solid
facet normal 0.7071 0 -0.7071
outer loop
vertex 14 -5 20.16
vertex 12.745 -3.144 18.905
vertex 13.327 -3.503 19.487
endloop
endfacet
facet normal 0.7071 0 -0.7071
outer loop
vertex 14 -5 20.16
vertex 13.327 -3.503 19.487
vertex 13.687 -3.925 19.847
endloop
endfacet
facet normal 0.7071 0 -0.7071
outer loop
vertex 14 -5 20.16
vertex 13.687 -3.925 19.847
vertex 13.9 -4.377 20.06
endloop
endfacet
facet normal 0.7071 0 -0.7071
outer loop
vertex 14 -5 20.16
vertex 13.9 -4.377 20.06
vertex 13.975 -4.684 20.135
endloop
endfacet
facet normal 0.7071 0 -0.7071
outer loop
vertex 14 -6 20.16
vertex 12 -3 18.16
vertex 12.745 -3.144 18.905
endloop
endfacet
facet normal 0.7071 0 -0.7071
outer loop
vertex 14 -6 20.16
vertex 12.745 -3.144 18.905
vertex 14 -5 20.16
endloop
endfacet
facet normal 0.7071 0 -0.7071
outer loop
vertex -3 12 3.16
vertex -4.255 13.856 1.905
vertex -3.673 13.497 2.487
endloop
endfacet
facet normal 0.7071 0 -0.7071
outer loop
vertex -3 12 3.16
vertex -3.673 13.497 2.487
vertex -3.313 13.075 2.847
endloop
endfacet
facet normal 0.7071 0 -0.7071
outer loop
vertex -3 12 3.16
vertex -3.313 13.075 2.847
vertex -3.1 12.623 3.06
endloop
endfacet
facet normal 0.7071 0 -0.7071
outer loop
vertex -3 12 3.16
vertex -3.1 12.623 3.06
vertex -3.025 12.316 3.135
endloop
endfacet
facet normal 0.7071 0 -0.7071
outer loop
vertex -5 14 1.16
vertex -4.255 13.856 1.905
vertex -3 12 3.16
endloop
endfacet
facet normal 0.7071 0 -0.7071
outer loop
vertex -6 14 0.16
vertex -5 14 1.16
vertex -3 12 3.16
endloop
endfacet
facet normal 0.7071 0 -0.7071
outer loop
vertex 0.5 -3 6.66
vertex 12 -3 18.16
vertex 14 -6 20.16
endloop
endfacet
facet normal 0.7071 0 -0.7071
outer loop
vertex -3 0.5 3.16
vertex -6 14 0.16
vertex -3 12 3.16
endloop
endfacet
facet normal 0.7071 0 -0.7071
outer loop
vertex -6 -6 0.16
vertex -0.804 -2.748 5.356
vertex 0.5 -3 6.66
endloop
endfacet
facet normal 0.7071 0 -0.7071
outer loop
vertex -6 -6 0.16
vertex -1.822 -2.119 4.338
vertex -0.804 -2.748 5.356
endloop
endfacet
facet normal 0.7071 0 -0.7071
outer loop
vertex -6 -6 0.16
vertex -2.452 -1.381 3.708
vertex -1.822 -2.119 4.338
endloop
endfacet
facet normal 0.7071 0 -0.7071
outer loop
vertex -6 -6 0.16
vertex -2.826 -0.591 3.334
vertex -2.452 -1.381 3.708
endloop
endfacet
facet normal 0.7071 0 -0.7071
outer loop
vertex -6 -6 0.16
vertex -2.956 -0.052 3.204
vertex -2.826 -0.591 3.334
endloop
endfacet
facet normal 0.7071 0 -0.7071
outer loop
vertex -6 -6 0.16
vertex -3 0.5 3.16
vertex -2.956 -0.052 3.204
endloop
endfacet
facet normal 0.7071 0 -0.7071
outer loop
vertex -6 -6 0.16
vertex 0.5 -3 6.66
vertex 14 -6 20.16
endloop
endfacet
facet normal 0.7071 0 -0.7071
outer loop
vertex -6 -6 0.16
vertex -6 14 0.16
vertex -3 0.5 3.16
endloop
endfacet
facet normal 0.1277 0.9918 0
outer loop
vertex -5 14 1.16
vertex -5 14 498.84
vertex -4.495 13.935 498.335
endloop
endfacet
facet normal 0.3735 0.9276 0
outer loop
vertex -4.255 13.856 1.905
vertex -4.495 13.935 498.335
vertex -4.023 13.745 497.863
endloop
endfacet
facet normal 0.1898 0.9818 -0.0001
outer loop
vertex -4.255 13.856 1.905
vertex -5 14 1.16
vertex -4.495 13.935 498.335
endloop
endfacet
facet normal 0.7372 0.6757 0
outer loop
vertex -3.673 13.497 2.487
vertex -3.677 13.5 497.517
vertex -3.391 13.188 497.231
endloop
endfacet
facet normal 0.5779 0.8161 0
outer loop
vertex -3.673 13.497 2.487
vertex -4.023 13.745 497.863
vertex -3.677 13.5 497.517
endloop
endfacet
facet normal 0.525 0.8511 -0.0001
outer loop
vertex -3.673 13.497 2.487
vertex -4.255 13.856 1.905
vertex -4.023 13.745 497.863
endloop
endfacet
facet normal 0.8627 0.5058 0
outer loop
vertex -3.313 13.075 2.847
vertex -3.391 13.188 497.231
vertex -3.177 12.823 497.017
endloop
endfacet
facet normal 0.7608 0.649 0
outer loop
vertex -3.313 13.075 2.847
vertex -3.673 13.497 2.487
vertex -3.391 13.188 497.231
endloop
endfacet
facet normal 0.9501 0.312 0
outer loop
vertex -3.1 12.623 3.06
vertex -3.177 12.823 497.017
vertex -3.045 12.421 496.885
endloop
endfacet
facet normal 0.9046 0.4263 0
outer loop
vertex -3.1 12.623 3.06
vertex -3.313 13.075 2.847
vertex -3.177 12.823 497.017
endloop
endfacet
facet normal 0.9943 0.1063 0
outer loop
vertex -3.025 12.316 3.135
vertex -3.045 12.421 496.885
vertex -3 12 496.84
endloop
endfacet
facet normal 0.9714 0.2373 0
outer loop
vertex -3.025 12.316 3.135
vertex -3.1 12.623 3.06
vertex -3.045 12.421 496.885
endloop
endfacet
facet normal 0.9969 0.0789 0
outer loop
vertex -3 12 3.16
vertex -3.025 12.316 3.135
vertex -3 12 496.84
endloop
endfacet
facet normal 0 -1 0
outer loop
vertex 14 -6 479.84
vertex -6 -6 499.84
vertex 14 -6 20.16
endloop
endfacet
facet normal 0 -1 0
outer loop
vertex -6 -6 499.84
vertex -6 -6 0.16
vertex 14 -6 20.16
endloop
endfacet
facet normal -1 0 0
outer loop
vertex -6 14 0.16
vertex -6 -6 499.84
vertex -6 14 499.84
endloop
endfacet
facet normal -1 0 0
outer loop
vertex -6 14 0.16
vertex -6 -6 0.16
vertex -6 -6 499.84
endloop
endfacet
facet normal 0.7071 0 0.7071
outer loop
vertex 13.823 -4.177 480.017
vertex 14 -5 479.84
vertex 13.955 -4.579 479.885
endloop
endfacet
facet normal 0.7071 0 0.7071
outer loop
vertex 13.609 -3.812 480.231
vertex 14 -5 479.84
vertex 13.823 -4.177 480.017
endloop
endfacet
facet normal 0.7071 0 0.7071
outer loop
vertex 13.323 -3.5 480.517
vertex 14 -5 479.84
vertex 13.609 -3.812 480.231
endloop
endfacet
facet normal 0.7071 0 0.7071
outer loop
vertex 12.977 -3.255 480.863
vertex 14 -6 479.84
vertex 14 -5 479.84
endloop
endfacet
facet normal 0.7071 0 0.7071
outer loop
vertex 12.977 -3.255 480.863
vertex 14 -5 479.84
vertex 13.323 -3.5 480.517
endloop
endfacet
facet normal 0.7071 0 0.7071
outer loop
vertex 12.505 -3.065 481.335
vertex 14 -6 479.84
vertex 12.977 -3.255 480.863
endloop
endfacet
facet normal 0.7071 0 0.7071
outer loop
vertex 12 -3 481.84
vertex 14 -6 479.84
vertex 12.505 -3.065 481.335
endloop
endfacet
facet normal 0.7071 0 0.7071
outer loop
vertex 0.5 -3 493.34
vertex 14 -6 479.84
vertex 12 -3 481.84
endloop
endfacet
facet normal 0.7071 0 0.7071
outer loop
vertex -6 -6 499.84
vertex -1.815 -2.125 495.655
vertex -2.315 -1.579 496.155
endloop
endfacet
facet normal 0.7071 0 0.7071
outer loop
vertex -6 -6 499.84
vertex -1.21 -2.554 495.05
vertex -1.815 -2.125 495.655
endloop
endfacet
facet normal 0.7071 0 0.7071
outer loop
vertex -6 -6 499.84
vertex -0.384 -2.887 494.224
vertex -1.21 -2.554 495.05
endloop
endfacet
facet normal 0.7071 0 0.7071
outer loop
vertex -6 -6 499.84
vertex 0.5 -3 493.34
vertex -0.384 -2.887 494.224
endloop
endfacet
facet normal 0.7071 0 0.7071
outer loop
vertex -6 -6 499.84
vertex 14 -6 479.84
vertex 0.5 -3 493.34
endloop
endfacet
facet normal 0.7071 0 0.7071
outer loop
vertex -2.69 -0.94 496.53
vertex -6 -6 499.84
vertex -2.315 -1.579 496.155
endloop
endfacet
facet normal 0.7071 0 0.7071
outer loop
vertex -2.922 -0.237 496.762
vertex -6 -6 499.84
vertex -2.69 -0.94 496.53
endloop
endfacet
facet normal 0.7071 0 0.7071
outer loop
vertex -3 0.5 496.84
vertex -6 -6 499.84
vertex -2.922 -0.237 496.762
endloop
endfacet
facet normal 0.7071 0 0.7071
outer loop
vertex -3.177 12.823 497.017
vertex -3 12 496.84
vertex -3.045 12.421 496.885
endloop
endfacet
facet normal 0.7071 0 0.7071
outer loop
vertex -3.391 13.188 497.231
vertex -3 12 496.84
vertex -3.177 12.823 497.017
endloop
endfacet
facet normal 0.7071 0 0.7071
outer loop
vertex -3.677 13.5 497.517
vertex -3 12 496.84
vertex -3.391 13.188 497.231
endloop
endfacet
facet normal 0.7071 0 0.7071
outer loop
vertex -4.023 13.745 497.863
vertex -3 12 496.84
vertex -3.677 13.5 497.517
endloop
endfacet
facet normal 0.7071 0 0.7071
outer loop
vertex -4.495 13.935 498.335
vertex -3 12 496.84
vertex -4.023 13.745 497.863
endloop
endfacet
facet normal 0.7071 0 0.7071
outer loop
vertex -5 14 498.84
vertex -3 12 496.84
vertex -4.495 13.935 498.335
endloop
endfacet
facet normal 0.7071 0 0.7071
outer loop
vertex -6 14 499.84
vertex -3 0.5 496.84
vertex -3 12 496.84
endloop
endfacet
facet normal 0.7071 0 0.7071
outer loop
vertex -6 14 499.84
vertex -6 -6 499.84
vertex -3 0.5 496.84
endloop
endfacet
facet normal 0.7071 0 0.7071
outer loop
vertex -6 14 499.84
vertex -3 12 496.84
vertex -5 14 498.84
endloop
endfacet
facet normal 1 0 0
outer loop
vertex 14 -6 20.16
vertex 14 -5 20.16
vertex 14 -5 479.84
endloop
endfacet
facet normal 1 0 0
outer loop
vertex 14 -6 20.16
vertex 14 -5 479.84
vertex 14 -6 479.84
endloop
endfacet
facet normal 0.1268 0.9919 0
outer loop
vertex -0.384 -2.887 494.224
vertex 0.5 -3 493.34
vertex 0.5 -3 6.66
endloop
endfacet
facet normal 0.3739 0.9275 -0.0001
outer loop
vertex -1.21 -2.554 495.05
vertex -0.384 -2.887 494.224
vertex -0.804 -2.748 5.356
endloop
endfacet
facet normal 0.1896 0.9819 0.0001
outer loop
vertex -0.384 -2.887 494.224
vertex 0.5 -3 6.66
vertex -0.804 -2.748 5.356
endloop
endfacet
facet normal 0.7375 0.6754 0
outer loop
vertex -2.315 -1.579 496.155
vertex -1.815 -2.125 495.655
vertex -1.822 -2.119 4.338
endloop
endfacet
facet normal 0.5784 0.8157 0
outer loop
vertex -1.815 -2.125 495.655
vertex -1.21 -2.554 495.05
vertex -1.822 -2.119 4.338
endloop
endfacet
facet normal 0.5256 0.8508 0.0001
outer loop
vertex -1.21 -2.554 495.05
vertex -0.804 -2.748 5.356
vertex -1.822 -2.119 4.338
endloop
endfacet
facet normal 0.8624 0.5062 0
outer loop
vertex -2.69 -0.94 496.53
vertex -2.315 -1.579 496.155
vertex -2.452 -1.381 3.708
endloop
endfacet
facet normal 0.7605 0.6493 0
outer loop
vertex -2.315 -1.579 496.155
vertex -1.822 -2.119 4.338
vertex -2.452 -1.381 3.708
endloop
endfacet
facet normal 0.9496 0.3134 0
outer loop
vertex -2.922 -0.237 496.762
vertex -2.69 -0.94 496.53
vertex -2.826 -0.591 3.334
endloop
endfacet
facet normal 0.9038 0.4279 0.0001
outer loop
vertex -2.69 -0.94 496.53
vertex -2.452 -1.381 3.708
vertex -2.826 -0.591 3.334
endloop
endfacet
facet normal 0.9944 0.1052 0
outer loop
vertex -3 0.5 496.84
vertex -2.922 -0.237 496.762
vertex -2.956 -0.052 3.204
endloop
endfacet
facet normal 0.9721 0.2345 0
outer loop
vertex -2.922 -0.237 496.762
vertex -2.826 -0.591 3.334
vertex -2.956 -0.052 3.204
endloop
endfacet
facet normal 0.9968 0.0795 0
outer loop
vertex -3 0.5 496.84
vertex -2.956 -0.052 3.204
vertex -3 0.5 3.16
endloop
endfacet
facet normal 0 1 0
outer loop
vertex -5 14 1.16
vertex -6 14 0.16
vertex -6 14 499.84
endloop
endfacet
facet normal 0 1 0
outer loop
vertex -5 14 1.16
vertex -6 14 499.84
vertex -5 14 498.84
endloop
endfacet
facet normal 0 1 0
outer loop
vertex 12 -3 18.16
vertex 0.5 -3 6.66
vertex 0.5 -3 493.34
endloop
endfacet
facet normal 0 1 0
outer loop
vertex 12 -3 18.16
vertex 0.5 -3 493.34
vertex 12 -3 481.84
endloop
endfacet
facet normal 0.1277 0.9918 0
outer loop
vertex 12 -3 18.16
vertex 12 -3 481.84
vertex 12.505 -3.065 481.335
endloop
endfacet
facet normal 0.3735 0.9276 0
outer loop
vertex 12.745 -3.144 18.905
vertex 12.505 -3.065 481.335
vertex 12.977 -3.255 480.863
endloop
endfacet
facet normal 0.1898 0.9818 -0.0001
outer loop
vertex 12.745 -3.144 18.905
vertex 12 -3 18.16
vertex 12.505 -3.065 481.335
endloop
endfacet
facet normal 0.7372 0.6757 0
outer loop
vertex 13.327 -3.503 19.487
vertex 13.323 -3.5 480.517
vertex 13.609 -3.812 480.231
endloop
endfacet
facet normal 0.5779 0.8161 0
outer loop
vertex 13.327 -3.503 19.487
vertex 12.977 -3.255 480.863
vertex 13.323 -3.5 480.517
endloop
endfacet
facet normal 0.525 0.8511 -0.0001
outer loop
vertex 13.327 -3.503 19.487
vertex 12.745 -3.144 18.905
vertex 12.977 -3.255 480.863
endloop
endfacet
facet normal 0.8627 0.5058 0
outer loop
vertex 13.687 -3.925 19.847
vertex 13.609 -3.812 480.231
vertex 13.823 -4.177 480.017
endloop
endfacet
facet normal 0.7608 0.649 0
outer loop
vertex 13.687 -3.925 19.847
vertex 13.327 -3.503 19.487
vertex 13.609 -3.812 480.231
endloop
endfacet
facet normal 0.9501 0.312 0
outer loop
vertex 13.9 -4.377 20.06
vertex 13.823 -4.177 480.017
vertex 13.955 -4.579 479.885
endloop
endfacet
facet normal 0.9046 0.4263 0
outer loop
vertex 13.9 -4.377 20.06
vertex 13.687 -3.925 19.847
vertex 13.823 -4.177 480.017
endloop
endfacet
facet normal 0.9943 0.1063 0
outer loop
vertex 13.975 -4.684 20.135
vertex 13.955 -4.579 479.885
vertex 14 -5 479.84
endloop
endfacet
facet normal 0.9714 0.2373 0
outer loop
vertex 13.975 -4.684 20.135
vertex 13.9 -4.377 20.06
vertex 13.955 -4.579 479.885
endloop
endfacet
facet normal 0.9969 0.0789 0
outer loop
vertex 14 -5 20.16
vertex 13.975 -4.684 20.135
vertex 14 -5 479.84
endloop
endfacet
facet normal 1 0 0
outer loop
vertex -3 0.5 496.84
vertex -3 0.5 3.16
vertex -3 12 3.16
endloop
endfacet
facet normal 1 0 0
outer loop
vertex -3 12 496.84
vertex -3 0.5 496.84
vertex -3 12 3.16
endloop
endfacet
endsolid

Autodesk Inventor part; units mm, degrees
ref_plane "Start plane" through (0, 0, 0.16) normal (0, 0, 1) x (1, 0, 0)
ref_plane "End plane" through (0, 0, 499.84) normal (0, 0, 1) x (1, 0, 0)
sketch "Sketch" plane through (0, 0, 0) normal (0, 0, 1) x (1, 0, 0)
  line L0 (-3, 0.5) -> (-3, 12)
  line L1 (-6, 14) -> (-5, 14)
  line L2 (-6, -6) -> (-6, 14)
  line L3 (-6, -6) -> (14, -6)
  line L4 (14, -5) -> (14, -6)
  line L5 (0.5, -3) -> (12, -3)
  arc A0 (-3, 0.5) -> (0.5, -3) centre (0.5, 0.5) ccw
  arc A1 (-3, 12) -> (-5, 14) centre (-5, 12) ccw
  arc A2 (14, -5) -> (12, -3) centre (12, -5) ccw
  line L6 (0, 18.4971) -> (0, -10.0828) construction
  line L7 (-10.0828, 0) -> (18.4971, 0) construction
  point P0 (-3, -3)
  point P1 (-3, 14)
  point P2 (14, -3)
  dimension "d4" = 20
  dimension "d6" = 20
  dimension "d8" = 3
  dimension "d10" = 3
  dimension "d17" = 3.5
  dimension "d18" = 2
  dimension "d19" = 6
  dimension "d20" = 6
extrude "Body" add sketch "Sketch" along normal up to surface (499.68 mm away) from surface at 0.16
sketch "Sketch3" plane through (0, 0, 0) normal (0, 0, 1) x (1, 0, 0)
  line L0 (0, 0) -> (10, 0)
ref_plane "Work Plane10" through (0, 0, 0) normal (0, -1, 0) x (1, 0, 0)
sketch "Sketch4" plane through (0, 0, 0) normal (0, -1, 0) x (1, 0, 0)
  line L0 (-2, 0.16) -> (12, 0.16)
  line L1 (-2, 499.84) -> (12, 499.84)
  dimension "d24" = 499.68
ref_plane "Work Plane11" through (-6, 4, 0.16) normal (0.7071, 0, -0.7071) x (-0.7071, 0, -0.7071)
split "Split1" plane through (-6, 4, 0.16) removes the side toward (0.7071, 0, -0.7071)
ref_plane "Work Plane12" through (-6, 4, 499.84) normal (0.7071, 0, 0.7071) x (0.7071, 0, -0.7071)
split "Split2" plane through (-6, 4, 499.84) removes the side toward (0.7071, 0, 0.7071)
equation "\"d4\" = b"
equation "\"d6\" = b"
equation "\"d8\" = ParT"
equation "\"d10\" = ParT"
equation "\"d17\" = R"
equation "\"d18\" = R1"
equation "\"d19\" = ex"
equation "\"d20\" = d19"
equation "\"d11\" = G_L"
equation "\"b\" = 20"
equation "\"ParT\" = 3"
equation "\"R\" = 3.5"
equation "\"R1\" = 2"
equation "\"G_L\" = d24"
equation "\"ex\" = 6"
equation "\"G_OFFSET_START\" = -0.16"
equation "\"G_OFFSET_END\" = -0.16"
equation "\"d21\" = -G_OFFSET_START"
equation "\"d22\" = G_OFFSET_END + B_L"
equation "\"B_L\" = 500"
properties part number "ISO 657-1 - L20x20x3-499.68" material "Stainless Steel"
